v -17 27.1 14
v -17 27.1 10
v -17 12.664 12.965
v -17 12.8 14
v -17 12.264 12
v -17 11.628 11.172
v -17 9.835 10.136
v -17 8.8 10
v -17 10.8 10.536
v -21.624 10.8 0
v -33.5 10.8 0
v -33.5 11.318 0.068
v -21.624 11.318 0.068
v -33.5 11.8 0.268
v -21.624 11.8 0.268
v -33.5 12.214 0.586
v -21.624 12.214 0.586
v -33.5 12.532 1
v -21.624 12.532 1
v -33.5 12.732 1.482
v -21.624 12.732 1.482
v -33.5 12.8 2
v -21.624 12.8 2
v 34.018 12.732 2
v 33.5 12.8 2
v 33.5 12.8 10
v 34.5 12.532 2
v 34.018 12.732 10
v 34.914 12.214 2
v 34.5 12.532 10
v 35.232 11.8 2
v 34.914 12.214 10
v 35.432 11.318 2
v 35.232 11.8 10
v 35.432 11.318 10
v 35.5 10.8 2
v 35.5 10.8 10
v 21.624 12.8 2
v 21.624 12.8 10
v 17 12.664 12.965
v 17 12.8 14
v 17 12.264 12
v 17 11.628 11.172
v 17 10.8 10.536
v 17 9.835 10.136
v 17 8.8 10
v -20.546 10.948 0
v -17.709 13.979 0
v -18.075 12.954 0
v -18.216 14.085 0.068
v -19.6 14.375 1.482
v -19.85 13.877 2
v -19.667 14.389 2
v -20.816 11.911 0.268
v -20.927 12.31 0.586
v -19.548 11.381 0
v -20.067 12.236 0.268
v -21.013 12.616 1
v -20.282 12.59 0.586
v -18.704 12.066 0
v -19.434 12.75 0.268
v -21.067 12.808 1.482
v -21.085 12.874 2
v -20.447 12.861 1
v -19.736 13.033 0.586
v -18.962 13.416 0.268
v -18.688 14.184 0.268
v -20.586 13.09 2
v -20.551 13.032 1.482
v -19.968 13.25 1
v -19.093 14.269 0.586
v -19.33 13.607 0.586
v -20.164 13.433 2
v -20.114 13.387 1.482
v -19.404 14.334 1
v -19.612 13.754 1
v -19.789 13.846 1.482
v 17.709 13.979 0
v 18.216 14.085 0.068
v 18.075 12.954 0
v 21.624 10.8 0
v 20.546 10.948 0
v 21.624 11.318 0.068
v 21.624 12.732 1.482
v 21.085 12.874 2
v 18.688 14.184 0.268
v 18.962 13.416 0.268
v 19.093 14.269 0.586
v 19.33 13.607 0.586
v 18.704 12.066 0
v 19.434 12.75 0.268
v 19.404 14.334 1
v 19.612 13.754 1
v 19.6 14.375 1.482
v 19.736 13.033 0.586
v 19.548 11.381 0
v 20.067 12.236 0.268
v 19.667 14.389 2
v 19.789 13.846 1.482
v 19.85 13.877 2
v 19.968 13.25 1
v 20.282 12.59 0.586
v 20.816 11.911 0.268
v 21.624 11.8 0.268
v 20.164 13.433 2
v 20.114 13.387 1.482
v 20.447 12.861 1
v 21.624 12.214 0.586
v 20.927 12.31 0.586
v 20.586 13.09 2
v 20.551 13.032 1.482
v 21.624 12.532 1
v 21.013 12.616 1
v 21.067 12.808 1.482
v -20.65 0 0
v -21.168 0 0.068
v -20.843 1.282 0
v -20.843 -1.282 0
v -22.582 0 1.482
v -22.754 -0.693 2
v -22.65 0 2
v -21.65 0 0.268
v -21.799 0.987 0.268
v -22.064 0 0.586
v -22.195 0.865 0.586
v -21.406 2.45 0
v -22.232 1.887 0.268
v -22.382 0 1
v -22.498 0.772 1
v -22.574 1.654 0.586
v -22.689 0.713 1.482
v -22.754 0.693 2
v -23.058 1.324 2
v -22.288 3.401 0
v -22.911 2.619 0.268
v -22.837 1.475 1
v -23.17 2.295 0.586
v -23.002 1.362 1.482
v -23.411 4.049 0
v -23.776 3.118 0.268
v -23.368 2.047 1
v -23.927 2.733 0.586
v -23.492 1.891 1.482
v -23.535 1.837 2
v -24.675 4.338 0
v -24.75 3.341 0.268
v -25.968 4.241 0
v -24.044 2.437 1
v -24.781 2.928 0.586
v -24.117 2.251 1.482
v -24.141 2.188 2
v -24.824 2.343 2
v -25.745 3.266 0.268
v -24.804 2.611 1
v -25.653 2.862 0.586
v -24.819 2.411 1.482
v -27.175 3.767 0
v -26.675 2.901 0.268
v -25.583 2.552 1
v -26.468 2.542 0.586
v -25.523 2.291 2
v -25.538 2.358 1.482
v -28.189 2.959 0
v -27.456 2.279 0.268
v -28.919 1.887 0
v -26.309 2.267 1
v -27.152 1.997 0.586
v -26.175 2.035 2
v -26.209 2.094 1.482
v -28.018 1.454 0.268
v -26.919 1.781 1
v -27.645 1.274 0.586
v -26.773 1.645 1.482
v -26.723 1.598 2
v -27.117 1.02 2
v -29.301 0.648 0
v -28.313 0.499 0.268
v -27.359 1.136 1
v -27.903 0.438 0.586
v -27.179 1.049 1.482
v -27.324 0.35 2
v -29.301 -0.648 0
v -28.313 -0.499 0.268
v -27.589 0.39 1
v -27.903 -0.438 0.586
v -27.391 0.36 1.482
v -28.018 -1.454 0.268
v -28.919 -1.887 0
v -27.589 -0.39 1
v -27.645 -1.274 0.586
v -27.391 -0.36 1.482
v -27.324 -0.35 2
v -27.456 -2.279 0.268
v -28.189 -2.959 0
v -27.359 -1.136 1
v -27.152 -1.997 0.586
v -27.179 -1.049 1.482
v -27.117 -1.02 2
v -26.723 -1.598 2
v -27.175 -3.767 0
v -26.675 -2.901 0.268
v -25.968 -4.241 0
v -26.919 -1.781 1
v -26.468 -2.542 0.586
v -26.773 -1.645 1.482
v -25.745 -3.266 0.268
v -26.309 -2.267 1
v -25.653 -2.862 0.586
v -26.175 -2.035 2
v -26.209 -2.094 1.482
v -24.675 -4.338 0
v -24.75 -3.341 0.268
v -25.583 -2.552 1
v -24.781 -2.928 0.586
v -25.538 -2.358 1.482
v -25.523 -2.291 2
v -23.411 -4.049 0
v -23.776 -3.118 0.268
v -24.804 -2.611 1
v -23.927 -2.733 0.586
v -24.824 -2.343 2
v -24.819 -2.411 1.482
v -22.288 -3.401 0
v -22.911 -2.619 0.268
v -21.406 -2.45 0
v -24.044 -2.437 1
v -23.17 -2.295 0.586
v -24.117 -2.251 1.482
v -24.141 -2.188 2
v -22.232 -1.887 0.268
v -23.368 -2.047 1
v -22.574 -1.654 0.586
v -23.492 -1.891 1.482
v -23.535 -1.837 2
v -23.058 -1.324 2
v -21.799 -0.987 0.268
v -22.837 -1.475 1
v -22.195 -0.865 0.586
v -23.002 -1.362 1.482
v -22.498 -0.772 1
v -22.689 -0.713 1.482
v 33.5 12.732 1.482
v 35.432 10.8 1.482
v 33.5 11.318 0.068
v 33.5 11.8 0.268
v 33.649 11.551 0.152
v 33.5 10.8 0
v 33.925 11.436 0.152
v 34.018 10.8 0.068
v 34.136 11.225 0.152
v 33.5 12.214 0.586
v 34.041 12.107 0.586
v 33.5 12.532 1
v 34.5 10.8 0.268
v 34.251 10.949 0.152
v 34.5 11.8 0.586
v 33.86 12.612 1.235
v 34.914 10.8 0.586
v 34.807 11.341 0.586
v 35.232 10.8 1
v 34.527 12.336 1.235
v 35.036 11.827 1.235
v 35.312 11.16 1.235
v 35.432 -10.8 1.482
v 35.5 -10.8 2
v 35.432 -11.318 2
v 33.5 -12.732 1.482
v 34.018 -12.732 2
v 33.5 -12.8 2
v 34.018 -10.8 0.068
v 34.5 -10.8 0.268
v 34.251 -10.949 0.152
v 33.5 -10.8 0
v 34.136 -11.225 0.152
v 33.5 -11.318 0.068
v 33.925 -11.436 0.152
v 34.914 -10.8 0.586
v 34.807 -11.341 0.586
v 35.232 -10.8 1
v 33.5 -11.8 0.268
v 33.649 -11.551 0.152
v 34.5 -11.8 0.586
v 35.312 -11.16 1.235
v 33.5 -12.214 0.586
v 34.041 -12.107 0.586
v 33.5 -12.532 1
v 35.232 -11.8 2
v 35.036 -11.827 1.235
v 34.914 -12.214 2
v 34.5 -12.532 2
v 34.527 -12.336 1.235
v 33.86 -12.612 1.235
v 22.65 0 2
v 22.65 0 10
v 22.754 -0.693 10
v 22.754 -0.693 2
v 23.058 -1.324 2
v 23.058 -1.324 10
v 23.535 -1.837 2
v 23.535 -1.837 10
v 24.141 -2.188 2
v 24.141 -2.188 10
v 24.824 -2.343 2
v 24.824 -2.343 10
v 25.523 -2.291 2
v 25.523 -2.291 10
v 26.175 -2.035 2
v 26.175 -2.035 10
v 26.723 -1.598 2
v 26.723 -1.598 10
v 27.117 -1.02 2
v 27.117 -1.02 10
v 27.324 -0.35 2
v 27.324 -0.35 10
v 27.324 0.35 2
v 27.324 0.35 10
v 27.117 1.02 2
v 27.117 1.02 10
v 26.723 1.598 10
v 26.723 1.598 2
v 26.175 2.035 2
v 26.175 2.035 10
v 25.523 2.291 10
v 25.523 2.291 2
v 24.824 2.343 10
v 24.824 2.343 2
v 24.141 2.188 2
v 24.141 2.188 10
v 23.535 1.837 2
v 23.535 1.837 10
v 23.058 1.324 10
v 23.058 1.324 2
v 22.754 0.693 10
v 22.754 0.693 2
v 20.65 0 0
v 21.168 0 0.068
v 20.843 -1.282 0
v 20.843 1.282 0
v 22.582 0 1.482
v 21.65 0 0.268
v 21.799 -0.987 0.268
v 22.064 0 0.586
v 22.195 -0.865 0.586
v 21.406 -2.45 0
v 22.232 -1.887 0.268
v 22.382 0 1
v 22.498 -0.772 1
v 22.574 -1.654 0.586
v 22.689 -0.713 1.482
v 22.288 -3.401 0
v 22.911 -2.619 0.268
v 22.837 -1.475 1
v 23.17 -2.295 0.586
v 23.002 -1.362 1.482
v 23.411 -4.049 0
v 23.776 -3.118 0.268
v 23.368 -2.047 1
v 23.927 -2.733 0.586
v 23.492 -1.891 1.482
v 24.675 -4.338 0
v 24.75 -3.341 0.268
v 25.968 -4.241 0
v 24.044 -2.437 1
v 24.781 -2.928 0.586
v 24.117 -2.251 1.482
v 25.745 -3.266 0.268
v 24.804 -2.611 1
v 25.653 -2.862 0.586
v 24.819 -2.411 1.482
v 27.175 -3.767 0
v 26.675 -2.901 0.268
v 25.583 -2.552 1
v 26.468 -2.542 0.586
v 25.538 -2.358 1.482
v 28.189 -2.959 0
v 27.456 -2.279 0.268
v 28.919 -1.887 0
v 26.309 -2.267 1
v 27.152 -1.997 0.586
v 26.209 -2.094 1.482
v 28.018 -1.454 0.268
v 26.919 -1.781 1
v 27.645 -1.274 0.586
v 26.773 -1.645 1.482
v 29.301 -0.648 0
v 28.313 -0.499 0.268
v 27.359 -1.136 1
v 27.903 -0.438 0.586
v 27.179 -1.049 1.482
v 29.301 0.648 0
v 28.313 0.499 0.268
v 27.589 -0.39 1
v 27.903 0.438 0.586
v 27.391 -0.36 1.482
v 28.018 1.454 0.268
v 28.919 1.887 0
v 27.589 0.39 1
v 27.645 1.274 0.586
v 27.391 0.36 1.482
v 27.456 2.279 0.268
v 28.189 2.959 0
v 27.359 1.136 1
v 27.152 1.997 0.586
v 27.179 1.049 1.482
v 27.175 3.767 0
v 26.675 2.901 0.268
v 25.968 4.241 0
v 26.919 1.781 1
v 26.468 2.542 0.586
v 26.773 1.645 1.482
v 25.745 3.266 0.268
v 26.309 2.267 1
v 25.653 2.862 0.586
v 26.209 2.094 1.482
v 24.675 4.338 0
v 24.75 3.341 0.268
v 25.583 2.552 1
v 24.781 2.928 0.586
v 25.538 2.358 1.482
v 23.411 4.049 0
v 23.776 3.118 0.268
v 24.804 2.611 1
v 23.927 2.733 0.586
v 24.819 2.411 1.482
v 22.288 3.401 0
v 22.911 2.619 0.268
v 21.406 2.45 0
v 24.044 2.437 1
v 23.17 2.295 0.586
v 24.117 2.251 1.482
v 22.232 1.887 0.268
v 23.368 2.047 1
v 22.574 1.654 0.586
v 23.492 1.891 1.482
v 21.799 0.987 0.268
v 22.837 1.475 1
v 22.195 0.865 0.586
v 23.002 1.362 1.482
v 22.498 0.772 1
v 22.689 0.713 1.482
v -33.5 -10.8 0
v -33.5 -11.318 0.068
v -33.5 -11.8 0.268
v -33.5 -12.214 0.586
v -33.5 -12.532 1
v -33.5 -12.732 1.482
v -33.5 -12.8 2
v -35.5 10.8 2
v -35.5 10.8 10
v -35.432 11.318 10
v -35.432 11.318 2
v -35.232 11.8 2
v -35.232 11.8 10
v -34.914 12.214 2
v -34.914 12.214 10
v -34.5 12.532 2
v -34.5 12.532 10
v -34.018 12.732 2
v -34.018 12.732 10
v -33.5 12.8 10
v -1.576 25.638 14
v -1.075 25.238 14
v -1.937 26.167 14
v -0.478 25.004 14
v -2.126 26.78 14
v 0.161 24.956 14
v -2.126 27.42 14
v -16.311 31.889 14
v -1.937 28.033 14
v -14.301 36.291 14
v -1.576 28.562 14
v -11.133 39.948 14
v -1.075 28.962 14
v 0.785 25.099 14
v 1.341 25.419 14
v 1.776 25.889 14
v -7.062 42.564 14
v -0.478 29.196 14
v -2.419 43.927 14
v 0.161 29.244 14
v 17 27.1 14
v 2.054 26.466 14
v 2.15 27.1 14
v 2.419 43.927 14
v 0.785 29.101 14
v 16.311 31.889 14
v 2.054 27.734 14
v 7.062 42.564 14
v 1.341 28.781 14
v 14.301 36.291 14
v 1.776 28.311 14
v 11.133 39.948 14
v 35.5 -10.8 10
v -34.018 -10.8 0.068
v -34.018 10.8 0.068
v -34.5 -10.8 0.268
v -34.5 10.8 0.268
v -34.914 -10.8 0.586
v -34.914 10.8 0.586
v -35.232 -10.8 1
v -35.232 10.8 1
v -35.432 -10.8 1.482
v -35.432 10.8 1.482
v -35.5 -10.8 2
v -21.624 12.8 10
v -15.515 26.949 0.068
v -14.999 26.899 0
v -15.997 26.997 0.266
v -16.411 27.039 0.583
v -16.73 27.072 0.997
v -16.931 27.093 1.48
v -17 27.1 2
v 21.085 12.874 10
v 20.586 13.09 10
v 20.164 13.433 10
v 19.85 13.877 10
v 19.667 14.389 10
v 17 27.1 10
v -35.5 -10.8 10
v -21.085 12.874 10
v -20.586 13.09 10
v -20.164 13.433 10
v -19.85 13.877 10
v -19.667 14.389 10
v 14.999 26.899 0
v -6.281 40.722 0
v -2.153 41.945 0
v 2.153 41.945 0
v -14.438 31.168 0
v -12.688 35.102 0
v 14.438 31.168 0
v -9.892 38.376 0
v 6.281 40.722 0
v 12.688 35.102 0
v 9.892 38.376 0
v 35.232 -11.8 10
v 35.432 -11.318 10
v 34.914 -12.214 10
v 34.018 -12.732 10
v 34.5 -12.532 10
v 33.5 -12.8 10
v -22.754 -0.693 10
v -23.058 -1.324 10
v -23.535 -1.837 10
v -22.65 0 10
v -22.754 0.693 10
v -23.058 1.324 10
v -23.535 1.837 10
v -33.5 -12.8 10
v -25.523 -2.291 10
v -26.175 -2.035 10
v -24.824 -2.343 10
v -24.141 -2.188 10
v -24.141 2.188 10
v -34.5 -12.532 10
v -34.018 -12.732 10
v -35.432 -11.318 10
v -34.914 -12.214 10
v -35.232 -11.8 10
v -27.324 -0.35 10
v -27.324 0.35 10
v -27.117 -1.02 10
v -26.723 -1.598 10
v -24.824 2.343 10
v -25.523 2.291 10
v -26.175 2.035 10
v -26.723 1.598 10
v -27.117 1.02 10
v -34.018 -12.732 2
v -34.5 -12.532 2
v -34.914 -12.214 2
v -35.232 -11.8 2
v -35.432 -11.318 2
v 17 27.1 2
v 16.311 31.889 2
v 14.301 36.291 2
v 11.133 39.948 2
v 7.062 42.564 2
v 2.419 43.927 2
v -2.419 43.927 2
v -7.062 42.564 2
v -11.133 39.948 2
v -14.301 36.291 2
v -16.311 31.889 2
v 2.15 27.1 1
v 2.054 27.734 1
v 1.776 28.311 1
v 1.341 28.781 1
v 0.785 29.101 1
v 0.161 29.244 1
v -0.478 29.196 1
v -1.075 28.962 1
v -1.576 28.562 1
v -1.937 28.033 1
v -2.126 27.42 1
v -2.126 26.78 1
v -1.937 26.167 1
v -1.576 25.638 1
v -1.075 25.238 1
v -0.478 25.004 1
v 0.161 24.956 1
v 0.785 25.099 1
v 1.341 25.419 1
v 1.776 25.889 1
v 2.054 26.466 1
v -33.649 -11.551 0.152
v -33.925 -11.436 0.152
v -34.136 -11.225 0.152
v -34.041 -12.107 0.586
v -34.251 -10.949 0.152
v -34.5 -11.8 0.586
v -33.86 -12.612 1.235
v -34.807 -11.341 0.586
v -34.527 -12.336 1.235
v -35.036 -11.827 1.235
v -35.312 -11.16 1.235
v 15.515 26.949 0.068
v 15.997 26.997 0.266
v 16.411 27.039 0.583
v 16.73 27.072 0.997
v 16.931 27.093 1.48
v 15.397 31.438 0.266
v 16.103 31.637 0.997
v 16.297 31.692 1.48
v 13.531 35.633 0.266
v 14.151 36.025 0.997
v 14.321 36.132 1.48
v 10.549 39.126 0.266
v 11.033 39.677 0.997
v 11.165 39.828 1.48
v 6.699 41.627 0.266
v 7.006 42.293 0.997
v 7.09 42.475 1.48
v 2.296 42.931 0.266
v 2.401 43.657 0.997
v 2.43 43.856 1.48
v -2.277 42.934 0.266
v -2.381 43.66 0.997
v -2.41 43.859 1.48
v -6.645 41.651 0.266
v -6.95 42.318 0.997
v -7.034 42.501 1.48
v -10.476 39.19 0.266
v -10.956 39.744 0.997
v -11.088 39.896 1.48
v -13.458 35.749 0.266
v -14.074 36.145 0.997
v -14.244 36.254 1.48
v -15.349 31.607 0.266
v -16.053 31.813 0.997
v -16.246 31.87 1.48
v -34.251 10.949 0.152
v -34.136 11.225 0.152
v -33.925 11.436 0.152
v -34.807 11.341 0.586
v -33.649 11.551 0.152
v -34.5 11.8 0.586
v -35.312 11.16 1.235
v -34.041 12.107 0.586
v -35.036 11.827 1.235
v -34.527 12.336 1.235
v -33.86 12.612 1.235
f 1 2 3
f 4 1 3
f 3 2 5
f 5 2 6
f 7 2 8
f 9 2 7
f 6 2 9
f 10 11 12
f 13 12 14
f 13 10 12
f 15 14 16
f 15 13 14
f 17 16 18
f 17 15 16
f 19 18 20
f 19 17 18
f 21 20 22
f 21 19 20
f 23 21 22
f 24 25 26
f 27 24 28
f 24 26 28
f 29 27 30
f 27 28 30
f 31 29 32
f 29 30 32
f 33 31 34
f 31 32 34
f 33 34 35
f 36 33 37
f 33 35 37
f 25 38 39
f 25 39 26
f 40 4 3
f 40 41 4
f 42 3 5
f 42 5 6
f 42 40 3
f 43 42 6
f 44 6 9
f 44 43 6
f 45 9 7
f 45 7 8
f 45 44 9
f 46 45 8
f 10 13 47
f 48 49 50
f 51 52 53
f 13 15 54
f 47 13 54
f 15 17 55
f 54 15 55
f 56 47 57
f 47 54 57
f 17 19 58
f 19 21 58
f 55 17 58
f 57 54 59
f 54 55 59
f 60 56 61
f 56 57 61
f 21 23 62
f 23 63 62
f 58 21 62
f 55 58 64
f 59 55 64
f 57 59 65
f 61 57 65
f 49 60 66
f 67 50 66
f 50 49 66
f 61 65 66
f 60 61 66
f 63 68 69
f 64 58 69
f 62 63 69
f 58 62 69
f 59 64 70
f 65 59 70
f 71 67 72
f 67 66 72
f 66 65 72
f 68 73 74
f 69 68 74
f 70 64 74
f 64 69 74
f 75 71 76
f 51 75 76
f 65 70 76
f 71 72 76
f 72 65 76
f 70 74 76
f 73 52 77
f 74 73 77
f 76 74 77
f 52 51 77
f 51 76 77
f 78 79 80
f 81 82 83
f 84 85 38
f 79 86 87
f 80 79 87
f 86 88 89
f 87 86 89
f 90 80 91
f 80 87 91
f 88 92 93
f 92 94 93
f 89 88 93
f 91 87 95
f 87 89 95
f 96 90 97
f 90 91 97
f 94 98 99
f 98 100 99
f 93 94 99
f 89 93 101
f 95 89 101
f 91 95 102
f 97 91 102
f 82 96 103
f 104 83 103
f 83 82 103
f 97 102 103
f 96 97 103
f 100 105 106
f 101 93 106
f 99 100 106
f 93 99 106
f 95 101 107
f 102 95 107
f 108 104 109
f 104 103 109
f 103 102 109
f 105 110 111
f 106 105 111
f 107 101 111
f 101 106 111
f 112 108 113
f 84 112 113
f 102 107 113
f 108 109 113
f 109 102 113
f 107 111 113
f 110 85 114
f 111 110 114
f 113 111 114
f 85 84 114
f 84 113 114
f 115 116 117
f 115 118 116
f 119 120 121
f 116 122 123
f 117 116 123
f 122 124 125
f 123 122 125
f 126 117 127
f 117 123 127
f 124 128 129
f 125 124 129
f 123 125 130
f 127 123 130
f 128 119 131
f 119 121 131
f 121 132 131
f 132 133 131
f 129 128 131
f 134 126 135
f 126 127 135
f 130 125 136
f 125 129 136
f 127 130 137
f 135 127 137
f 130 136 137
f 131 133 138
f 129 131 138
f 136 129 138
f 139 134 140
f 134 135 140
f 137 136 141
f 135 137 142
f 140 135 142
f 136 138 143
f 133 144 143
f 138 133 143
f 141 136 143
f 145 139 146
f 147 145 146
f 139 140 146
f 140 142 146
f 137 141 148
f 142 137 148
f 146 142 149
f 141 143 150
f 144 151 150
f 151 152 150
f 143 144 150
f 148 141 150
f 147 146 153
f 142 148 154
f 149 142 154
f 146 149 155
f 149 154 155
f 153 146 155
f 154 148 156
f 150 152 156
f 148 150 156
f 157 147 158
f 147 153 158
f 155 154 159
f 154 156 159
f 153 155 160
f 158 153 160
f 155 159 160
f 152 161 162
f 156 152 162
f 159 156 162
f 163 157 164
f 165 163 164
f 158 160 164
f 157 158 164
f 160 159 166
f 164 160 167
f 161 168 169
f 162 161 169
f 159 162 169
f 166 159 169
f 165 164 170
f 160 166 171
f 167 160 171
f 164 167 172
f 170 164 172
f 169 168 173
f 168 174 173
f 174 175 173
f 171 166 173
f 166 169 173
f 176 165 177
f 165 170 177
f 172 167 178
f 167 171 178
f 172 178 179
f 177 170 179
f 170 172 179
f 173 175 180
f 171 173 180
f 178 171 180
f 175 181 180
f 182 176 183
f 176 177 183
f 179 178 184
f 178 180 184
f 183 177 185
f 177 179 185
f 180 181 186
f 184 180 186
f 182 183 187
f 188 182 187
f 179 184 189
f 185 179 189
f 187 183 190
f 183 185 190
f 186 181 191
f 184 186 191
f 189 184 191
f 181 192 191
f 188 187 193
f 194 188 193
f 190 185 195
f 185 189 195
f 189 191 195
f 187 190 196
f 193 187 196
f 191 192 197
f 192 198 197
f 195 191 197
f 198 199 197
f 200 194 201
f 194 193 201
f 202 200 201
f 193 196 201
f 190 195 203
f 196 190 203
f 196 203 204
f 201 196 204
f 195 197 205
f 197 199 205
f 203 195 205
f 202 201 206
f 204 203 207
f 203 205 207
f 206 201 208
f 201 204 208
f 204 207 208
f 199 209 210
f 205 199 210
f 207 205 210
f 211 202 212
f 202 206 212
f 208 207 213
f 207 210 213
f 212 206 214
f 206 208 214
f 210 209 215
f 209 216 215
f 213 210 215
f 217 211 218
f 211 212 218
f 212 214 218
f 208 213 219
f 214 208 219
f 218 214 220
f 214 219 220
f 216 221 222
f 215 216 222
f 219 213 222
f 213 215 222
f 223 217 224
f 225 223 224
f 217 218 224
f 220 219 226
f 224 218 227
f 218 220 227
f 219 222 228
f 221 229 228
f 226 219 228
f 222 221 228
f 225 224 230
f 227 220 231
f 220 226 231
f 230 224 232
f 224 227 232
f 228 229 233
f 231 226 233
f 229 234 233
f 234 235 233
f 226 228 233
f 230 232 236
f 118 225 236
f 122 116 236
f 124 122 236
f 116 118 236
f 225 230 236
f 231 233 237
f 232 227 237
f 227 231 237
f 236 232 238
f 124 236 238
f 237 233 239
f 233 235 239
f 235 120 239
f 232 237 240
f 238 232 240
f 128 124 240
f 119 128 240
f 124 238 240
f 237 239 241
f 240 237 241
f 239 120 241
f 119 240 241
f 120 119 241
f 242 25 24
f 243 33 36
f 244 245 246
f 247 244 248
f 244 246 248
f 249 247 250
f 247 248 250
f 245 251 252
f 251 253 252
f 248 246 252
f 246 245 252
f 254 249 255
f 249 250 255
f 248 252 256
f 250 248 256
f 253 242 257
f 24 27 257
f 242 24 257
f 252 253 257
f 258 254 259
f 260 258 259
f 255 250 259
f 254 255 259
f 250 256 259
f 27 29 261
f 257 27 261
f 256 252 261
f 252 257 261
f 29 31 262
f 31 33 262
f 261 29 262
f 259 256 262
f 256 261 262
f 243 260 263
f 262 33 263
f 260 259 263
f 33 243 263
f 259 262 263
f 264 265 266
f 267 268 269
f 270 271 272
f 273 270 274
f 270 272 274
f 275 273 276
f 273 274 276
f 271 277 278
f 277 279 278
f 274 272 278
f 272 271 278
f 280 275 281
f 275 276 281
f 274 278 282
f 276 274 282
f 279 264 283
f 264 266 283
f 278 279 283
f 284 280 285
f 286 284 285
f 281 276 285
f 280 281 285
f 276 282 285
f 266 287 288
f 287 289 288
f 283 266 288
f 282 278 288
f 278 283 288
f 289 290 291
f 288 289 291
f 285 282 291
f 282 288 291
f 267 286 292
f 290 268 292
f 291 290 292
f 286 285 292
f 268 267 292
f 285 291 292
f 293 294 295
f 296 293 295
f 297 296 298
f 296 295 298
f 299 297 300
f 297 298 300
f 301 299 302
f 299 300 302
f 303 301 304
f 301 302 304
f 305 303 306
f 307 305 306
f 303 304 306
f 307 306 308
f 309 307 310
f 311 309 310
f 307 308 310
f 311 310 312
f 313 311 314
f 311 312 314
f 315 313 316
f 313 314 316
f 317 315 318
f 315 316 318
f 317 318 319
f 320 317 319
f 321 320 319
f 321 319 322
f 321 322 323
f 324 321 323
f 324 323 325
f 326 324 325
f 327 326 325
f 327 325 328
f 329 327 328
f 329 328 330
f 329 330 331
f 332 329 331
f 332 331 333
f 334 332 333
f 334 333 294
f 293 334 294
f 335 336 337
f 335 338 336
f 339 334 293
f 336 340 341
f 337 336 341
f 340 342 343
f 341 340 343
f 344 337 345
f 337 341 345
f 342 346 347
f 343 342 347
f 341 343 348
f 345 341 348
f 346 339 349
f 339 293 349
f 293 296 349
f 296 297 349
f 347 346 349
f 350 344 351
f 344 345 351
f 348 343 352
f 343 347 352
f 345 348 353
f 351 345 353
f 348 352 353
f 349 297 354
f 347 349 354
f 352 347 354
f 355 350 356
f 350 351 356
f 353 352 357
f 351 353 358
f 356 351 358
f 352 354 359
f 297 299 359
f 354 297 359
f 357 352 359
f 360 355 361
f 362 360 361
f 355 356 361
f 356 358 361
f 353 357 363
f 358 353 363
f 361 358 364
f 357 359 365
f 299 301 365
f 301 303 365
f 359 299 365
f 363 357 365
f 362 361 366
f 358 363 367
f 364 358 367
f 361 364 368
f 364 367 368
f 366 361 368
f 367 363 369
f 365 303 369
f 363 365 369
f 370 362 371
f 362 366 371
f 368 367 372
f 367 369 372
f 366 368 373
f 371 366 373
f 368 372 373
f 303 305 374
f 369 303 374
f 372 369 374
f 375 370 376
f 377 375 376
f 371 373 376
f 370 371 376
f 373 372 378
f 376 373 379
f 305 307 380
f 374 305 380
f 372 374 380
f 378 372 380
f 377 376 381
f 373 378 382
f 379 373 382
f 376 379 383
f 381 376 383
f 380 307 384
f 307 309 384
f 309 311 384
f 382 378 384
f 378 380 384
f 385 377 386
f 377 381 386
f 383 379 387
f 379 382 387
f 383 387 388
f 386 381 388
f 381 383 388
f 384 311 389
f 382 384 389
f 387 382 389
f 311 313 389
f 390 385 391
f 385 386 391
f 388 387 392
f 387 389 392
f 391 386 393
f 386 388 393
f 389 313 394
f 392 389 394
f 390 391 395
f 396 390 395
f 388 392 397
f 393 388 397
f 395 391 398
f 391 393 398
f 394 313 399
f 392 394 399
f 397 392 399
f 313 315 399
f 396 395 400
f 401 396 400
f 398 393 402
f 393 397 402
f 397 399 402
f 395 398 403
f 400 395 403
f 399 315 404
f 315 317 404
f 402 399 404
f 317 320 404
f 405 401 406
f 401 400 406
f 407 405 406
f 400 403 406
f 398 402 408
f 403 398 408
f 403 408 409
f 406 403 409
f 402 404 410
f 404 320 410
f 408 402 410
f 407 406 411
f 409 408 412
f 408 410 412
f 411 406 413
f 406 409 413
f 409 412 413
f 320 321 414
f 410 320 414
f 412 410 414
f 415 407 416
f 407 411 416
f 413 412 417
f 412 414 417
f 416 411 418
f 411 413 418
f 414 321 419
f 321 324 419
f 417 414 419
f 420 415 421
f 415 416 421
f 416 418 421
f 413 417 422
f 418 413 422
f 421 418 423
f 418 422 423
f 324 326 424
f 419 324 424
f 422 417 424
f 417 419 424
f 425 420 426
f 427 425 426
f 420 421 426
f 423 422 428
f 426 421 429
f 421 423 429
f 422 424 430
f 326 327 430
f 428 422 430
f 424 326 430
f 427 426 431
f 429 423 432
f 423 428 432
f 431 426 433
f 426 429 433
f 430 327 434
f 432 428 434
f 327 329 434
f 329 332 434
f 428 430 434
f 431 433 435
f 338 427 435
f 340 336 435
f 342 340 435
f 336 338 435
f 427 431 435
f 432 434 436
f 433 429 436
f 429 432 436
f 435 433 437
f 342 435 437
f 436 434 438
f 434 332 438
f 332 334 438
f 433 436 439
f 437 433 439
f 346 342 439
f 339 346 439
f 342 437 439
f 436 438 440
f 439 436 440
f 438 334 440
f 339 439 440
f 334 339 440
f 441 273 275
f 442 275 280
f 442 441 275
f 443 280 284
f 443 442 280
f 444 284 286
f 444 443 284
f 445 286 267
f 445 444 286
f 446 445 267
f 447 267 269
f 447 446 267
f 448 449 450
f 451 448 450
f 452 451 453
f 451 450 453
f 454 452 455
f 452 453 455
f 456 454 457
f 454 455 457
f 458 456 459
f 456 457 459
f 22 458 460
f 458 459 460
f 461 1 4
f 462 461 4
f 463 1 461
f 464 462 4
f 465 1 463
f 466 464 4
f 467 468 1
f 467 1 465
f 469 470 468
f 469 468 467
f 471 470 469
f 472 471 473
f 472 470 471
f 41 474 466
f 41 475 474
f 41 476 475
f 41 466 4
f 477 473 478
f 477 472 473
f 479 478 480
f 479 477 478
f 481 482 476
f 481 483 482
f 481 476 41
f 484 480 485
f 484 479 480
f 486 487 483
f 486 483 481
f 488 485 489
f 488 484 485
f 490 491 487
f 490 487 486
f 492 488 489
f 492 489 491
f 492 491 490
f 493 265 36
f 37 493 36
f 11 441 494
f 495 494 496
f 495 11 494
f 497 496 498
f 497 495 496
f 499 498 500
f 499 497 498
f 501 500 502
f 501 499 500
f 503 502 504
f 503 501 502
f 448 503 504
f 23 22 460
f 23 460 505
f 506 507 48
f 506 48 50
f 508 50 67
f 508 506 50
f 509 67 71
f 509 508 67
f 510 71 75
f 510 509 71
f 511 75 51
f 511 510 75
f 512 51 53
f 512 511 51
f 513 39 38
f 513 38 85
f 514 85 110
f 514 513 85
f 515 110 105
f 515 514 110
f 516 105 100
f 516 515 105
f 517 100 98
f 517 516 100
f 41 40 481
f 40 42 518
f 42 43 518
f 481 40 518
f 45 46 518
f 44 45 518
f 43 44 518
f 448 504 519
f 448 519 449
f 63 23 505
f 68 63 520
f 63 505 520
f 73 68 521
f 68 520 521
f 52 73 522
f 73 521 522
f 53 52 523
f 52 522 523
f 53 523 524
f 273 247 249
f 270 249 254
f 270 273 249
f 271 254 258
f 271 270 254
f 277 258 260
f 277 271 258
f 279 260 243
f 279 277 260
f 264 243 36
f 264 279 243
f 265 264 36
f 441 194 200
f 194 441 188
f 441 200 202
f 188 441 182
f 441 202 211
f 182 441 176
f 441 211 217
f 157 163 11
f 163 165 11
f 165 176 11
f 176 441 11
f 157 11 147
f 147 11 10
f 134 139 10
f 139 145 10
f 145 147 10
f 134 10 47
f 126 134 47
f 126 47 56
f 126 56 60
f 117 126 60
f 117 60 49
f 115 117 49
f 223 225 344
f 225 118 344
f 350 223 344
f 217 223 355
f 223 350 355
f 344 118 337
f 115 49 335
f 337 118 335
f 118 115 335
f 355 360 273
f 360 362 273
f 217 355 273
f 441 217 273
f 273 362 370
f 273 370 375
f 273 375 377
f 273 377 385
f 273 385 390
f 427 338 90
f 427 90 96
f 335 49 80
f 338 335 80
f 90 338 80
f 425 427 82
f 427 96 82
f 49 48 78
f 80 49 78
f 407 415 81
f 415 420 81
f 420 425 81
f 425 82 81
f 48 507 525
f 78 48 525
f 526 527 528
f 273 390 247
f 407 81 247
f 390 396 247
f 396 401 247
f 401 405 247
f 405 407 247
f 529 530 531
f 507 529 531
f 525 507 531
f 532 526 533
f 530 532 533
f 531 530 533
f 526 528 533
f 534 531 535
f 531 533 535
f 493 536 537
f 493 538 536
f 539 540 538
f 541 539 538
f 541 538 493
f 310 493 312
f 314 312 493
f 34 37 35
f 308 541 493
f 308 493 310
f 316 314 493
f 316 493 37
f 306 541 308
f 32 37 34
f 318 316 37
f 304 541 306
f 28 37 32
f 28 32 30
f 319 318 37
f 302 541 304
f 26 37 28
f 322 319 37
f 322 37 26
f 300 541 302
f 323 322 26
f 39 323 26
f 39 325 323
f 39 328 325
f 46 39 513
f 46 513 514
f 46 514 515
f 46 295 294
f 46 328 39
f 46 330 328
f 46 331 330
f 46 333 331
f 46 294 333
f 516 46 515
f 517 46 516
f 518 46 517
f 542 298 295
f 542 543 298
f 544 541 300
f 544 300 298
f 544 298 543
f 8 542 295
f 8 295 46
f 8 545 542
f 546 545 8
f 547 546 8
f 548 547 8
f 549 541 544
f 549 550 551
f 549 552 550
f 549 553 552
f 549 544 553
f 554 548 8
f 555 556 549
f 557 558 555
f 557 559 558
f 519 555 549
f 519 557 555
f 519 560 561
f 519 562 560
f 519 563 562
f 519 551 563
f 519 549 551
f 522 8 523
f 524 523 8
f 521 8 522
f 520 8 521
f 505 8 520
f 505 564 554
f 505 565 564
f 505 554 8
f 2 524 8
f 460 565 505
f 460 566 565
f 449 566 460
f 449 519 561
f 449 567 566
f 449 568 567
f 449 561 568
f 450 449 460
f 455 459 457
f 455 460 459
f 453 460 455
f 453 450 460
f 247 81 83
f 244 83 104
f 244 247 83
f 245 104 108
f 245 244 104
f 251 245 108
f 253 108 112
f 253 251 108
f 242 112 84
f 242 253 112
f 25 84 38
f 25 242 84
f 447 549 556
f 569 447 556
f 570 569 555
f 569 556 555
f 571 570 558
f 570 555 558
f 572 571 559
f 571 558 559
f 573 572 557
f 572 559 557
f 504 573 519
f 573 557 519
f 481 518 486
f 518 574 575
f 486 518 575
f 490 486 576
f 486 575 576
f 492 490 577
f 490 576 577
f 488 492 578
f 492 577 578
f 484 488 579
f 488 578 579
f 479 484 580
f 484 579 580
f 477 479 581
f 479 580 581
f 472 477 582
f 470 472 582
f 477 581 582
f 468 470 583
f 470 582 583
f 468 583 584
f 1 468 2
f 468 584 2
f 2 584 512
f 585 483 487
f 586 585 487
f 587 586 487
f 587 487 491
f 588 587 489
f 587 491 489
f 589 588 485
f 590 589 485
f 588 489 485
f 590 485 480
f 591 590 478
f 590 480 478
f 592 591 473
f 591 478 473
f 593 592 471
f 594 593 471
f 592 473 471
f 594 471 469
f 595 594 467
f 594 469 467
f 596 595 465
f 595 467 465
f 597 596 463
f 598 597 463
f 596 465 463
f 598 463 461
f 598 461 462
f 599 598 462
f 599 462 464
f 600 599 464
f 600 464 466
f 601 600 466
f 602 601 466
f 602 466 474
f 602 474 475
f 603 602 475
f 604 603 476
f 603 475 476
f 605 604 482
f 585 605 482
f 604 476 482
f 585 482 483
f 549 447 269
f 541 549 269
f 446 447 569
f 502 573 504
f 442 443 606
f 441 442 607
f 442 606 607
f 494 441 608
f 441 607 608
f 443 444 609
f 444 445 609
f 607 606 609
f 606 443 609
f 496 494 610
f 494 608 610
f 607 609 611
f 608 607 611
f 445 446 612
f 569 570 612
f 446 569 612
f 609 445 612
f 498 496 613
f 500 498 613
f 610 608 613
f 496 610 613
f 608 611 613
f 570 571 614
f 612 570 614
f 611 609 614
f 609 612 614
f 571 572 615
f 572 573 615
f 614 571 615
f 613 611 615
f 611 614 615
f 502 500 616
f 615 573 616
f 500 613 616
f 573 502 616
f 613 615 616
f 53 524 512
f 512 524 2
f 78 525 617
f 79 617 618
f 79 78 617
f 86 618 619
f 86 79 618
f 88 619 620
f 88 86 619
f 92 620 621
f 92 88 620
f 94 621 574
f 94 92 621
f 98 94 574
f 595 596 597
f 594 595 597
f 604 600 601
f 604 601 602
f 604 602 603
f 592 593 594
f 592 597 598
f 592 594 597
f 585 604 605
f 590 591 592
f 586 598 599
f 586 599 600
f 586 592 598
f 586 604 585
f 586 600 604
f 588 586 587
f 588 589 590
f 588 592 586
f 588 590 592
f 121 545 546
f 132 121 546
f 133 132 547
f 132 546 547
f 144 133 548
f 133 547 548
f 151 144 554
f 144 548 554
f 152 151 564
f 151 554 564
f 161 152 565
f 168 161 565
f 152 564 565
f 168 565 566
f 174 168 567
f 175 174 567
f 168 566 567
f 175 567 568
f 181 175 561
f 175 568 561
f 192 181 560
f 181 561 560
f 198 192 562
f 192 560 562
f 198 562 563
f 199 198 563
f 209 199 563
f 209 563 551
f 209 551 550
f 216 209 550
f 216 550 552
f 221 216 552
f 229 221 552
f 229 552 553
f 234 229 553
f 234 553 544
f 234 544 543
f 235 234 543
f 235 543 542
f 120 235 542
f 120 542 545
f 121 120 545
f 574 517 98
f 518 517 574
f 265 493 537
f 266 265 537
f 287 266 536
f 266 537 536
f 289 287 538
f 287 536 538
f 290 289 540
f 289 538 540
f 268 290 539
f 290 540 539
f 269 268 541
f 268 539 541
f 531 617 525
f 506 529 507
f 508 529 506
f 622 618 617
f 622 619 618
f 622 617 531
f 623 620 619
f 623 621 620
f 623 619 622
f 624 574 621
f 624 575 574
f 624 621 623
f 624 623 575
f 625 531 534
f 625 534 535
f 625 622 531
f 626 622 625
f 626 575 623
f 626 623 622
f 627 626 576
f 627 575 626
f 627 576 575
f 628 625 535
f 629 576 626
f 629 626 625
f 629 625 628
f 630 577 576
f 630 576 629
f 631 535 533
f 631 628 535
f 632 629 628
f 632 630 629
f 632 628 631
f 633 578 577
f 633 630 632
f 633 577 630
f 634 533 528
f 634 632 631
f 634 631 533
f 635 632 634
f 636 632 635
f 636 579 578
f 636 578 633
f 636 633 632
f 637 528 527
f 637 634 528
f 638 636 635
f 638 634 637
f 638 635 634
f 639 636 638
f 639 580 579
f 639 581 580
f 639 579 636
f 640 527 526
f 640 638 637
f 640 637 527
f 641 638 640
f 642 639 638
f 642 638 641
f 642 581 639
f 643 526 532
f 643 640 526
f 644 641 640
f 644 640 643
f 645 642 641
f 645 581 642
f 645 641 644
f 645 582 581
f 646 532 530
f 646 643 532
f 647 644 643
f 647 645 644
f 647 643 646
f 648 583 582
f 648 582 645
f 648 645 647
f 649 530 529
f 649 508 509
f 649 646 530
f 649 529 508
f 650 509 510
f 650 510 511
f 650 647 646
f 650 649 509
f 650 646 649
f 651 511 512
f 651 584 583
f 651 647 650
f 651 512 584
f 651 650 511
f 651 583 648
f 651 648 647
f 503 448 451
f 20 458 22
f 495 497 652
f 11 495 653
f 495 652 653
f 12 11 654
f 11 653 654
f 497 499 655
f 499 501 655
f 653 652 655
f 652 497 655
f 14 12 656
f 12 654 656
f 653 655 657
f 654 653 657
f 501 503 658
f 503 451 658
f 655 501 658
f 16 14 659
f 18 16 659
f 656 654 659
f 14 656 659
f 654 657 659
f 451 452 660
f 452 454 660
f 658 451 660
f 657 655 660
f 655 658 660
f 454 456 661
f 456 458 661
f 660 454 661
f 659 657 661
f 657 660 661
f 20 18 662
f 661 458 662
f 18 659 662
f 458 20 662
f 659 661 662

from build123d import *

# Parameters (mm, degrees)
SKETCH1_W           = 71
SKETCH1_H           = 25.6
BOSS_EXTRUDE1_DEPTH = 10
BOSS_EXTRUDE2_DEPTH = 14
FILLET1_R           = 4
CHAMFER1_START      = -22.201998907
CHAMFER1_OUTLINE_W  = 14.611297
CHAMFER1_OUTLINE_H  = 10
CHAMFER1_DEPTH      = 3.757366646
CHAMFER2_START      = 18.444632261
CHAMFER2_OUTLINE_W  = 14.611297
CHAMFER2_OUTLINE_H  = 10
CHAMFER2_DEPTH      = 3.757366646
FILLET3_R           = 2
SKETCH5_R           = 2.35
CUT_EXTRUDE1_DEPTH  = 14
FILLET4_R           = 2
SKETCH6_R           = 2.15
CUT_EXTRUDE2_DEPTH  = 13


with BuildPart() as part:
    # Sketch1 → Boss-Extrude1 (new body)
    with BuildSketch(Plane.XY):
        Rectangle(SKETCH1_W, SKETCH1_H)
    extrude(amount=BOSS_EXTRUDE1_DEPTH)

    # Sketch3 → Boss-Extrude2 (add)
    with BuildSketch(Plane.XY):
        with BuildLine():
            Line((-17, 12.8), (17, 12.8))
            Line((17, 12.8), (17, 27.1))
            ThreePointArc((17, 27.1), (0, 44.1), (-17, 27.1))
            Line((-17, 27.1), (-17, 12.8))
        make_face()
    extrude(amount=BOSS_EXTRUDE2_DEPTH)

    # Fillet1
    fillet1_edges = [part.edges().sort_by_distance(p)[0] for p in [
        (0, 12.8, 10),
    ]]
    fillet(fillet1_edges, radius=FILLET1_R - 0.0001)  # a hair under: the kernel refuses the full size

    # Chamfer1: read off the stored shape, not the designer's step
    # Chamfer1 outline → Chamfer1 (add)
    with BuildSketch(Plane(origin=(0, 0, 0), x_dir=(0.2053205817495901, 0.9786947730063801, 0), z_dir=(0.9786947730063802, -0.20532058174959006, 0)).offset(CHAMFER1_START)):
        with Locations((15.726529959, 5)):
            Rectangle(CHAMFER1_OUTLINE_W, CHAMFER1_OUTLINE_H)
    extrude(amount=CHAMFER1_DEPTH)

    # Chamfer2: read off the stored shape, not the designer's step
    # Chamfer2 outline → Chamfer2 (add)
    with BuildSketch(Plane(origin=(0, 0, 0), x_dir=(-0.2053205817495901, 0.9786947730063801, 0), z_dir=(0.9786947730063802, 0.20532058174959006, 0)).offset(CHAMFER2_START)):
        with Locations((15.726529959, 5)):
            Rectangle(CHAMFER2_OUTLINE_W, CHAMFER2_OUTLINE_H)
    extrude(amount=CHAMFER2_DEPTH)

    # Fillet3
    fillet3_edges = [part.edges().sort_by_distance(p)[0] for p in [
        (-20.000000001, 12.8, 5),
        (20.000000001, 12.8, 5),
        (35.5, -12.8, 5),
        (-35.5, -12.8, 5),
        (-35.5, 12.8, 5),
        (35.5, 12.8, 5),
    ]]
    fillet(fillet3_edges, radius=FILLET3_R)

    # Sketch5 → Cut-Extrude1 (cut)
    with BuildSketch(Plane.XY.offset(10)):
        with Locations((-25, 0)):
            Circle(SKETCH5_R)
        with Locations(Location((25, 0, 0), (0, 0, 180))):
            Circle(SKETCH5_R)
    extrude(amount=-CUT_EXTRUDE1_DEPTH, mode=Mode.SUBTRACT)

    # Fillet4
    fillet4_edges = [part.edges().sort_by_distance(p)[0] for p in [
        (-27.35, 0, 0),
        (27.35, 0, 0),
        (0, 44.1, 0),
        (-18.333284039, 20.744679418, 0),
        (27.561978811, 12.8, 0),
        (35.5, 0, 0),
        (0, -12.8, 0),
        (-35.5, 0, 0),
        (-27.561978811, 12.8, 0),
        (18.333284039, 20.744679418, 0),
        (-34.914213562, 12.214213562, 0),
        (-34.914213562, -12.214213562, 0),
        (34.914213562, -12.214213562, 0),
        (34.914213562, 12.214213562, 0),
        (-20.363259865, 13.247376039, 0),
        (20.363259865, 13.247376039, 0),
    ]]
    fillet(fillet4_edges, radius=FILLET4_R)

    # Sketch6 → Cut-Extrude2 (cut)
    with BuildSketch(Plane.XY.offset(14)):
        with Locations((0, 27.1)):
            Circle(SKETCH6_R)
    extrude(amount=-CUT_EXTRUDE2_DEPTH, mode=Mode.SUBTRACT)


solid = part.part
